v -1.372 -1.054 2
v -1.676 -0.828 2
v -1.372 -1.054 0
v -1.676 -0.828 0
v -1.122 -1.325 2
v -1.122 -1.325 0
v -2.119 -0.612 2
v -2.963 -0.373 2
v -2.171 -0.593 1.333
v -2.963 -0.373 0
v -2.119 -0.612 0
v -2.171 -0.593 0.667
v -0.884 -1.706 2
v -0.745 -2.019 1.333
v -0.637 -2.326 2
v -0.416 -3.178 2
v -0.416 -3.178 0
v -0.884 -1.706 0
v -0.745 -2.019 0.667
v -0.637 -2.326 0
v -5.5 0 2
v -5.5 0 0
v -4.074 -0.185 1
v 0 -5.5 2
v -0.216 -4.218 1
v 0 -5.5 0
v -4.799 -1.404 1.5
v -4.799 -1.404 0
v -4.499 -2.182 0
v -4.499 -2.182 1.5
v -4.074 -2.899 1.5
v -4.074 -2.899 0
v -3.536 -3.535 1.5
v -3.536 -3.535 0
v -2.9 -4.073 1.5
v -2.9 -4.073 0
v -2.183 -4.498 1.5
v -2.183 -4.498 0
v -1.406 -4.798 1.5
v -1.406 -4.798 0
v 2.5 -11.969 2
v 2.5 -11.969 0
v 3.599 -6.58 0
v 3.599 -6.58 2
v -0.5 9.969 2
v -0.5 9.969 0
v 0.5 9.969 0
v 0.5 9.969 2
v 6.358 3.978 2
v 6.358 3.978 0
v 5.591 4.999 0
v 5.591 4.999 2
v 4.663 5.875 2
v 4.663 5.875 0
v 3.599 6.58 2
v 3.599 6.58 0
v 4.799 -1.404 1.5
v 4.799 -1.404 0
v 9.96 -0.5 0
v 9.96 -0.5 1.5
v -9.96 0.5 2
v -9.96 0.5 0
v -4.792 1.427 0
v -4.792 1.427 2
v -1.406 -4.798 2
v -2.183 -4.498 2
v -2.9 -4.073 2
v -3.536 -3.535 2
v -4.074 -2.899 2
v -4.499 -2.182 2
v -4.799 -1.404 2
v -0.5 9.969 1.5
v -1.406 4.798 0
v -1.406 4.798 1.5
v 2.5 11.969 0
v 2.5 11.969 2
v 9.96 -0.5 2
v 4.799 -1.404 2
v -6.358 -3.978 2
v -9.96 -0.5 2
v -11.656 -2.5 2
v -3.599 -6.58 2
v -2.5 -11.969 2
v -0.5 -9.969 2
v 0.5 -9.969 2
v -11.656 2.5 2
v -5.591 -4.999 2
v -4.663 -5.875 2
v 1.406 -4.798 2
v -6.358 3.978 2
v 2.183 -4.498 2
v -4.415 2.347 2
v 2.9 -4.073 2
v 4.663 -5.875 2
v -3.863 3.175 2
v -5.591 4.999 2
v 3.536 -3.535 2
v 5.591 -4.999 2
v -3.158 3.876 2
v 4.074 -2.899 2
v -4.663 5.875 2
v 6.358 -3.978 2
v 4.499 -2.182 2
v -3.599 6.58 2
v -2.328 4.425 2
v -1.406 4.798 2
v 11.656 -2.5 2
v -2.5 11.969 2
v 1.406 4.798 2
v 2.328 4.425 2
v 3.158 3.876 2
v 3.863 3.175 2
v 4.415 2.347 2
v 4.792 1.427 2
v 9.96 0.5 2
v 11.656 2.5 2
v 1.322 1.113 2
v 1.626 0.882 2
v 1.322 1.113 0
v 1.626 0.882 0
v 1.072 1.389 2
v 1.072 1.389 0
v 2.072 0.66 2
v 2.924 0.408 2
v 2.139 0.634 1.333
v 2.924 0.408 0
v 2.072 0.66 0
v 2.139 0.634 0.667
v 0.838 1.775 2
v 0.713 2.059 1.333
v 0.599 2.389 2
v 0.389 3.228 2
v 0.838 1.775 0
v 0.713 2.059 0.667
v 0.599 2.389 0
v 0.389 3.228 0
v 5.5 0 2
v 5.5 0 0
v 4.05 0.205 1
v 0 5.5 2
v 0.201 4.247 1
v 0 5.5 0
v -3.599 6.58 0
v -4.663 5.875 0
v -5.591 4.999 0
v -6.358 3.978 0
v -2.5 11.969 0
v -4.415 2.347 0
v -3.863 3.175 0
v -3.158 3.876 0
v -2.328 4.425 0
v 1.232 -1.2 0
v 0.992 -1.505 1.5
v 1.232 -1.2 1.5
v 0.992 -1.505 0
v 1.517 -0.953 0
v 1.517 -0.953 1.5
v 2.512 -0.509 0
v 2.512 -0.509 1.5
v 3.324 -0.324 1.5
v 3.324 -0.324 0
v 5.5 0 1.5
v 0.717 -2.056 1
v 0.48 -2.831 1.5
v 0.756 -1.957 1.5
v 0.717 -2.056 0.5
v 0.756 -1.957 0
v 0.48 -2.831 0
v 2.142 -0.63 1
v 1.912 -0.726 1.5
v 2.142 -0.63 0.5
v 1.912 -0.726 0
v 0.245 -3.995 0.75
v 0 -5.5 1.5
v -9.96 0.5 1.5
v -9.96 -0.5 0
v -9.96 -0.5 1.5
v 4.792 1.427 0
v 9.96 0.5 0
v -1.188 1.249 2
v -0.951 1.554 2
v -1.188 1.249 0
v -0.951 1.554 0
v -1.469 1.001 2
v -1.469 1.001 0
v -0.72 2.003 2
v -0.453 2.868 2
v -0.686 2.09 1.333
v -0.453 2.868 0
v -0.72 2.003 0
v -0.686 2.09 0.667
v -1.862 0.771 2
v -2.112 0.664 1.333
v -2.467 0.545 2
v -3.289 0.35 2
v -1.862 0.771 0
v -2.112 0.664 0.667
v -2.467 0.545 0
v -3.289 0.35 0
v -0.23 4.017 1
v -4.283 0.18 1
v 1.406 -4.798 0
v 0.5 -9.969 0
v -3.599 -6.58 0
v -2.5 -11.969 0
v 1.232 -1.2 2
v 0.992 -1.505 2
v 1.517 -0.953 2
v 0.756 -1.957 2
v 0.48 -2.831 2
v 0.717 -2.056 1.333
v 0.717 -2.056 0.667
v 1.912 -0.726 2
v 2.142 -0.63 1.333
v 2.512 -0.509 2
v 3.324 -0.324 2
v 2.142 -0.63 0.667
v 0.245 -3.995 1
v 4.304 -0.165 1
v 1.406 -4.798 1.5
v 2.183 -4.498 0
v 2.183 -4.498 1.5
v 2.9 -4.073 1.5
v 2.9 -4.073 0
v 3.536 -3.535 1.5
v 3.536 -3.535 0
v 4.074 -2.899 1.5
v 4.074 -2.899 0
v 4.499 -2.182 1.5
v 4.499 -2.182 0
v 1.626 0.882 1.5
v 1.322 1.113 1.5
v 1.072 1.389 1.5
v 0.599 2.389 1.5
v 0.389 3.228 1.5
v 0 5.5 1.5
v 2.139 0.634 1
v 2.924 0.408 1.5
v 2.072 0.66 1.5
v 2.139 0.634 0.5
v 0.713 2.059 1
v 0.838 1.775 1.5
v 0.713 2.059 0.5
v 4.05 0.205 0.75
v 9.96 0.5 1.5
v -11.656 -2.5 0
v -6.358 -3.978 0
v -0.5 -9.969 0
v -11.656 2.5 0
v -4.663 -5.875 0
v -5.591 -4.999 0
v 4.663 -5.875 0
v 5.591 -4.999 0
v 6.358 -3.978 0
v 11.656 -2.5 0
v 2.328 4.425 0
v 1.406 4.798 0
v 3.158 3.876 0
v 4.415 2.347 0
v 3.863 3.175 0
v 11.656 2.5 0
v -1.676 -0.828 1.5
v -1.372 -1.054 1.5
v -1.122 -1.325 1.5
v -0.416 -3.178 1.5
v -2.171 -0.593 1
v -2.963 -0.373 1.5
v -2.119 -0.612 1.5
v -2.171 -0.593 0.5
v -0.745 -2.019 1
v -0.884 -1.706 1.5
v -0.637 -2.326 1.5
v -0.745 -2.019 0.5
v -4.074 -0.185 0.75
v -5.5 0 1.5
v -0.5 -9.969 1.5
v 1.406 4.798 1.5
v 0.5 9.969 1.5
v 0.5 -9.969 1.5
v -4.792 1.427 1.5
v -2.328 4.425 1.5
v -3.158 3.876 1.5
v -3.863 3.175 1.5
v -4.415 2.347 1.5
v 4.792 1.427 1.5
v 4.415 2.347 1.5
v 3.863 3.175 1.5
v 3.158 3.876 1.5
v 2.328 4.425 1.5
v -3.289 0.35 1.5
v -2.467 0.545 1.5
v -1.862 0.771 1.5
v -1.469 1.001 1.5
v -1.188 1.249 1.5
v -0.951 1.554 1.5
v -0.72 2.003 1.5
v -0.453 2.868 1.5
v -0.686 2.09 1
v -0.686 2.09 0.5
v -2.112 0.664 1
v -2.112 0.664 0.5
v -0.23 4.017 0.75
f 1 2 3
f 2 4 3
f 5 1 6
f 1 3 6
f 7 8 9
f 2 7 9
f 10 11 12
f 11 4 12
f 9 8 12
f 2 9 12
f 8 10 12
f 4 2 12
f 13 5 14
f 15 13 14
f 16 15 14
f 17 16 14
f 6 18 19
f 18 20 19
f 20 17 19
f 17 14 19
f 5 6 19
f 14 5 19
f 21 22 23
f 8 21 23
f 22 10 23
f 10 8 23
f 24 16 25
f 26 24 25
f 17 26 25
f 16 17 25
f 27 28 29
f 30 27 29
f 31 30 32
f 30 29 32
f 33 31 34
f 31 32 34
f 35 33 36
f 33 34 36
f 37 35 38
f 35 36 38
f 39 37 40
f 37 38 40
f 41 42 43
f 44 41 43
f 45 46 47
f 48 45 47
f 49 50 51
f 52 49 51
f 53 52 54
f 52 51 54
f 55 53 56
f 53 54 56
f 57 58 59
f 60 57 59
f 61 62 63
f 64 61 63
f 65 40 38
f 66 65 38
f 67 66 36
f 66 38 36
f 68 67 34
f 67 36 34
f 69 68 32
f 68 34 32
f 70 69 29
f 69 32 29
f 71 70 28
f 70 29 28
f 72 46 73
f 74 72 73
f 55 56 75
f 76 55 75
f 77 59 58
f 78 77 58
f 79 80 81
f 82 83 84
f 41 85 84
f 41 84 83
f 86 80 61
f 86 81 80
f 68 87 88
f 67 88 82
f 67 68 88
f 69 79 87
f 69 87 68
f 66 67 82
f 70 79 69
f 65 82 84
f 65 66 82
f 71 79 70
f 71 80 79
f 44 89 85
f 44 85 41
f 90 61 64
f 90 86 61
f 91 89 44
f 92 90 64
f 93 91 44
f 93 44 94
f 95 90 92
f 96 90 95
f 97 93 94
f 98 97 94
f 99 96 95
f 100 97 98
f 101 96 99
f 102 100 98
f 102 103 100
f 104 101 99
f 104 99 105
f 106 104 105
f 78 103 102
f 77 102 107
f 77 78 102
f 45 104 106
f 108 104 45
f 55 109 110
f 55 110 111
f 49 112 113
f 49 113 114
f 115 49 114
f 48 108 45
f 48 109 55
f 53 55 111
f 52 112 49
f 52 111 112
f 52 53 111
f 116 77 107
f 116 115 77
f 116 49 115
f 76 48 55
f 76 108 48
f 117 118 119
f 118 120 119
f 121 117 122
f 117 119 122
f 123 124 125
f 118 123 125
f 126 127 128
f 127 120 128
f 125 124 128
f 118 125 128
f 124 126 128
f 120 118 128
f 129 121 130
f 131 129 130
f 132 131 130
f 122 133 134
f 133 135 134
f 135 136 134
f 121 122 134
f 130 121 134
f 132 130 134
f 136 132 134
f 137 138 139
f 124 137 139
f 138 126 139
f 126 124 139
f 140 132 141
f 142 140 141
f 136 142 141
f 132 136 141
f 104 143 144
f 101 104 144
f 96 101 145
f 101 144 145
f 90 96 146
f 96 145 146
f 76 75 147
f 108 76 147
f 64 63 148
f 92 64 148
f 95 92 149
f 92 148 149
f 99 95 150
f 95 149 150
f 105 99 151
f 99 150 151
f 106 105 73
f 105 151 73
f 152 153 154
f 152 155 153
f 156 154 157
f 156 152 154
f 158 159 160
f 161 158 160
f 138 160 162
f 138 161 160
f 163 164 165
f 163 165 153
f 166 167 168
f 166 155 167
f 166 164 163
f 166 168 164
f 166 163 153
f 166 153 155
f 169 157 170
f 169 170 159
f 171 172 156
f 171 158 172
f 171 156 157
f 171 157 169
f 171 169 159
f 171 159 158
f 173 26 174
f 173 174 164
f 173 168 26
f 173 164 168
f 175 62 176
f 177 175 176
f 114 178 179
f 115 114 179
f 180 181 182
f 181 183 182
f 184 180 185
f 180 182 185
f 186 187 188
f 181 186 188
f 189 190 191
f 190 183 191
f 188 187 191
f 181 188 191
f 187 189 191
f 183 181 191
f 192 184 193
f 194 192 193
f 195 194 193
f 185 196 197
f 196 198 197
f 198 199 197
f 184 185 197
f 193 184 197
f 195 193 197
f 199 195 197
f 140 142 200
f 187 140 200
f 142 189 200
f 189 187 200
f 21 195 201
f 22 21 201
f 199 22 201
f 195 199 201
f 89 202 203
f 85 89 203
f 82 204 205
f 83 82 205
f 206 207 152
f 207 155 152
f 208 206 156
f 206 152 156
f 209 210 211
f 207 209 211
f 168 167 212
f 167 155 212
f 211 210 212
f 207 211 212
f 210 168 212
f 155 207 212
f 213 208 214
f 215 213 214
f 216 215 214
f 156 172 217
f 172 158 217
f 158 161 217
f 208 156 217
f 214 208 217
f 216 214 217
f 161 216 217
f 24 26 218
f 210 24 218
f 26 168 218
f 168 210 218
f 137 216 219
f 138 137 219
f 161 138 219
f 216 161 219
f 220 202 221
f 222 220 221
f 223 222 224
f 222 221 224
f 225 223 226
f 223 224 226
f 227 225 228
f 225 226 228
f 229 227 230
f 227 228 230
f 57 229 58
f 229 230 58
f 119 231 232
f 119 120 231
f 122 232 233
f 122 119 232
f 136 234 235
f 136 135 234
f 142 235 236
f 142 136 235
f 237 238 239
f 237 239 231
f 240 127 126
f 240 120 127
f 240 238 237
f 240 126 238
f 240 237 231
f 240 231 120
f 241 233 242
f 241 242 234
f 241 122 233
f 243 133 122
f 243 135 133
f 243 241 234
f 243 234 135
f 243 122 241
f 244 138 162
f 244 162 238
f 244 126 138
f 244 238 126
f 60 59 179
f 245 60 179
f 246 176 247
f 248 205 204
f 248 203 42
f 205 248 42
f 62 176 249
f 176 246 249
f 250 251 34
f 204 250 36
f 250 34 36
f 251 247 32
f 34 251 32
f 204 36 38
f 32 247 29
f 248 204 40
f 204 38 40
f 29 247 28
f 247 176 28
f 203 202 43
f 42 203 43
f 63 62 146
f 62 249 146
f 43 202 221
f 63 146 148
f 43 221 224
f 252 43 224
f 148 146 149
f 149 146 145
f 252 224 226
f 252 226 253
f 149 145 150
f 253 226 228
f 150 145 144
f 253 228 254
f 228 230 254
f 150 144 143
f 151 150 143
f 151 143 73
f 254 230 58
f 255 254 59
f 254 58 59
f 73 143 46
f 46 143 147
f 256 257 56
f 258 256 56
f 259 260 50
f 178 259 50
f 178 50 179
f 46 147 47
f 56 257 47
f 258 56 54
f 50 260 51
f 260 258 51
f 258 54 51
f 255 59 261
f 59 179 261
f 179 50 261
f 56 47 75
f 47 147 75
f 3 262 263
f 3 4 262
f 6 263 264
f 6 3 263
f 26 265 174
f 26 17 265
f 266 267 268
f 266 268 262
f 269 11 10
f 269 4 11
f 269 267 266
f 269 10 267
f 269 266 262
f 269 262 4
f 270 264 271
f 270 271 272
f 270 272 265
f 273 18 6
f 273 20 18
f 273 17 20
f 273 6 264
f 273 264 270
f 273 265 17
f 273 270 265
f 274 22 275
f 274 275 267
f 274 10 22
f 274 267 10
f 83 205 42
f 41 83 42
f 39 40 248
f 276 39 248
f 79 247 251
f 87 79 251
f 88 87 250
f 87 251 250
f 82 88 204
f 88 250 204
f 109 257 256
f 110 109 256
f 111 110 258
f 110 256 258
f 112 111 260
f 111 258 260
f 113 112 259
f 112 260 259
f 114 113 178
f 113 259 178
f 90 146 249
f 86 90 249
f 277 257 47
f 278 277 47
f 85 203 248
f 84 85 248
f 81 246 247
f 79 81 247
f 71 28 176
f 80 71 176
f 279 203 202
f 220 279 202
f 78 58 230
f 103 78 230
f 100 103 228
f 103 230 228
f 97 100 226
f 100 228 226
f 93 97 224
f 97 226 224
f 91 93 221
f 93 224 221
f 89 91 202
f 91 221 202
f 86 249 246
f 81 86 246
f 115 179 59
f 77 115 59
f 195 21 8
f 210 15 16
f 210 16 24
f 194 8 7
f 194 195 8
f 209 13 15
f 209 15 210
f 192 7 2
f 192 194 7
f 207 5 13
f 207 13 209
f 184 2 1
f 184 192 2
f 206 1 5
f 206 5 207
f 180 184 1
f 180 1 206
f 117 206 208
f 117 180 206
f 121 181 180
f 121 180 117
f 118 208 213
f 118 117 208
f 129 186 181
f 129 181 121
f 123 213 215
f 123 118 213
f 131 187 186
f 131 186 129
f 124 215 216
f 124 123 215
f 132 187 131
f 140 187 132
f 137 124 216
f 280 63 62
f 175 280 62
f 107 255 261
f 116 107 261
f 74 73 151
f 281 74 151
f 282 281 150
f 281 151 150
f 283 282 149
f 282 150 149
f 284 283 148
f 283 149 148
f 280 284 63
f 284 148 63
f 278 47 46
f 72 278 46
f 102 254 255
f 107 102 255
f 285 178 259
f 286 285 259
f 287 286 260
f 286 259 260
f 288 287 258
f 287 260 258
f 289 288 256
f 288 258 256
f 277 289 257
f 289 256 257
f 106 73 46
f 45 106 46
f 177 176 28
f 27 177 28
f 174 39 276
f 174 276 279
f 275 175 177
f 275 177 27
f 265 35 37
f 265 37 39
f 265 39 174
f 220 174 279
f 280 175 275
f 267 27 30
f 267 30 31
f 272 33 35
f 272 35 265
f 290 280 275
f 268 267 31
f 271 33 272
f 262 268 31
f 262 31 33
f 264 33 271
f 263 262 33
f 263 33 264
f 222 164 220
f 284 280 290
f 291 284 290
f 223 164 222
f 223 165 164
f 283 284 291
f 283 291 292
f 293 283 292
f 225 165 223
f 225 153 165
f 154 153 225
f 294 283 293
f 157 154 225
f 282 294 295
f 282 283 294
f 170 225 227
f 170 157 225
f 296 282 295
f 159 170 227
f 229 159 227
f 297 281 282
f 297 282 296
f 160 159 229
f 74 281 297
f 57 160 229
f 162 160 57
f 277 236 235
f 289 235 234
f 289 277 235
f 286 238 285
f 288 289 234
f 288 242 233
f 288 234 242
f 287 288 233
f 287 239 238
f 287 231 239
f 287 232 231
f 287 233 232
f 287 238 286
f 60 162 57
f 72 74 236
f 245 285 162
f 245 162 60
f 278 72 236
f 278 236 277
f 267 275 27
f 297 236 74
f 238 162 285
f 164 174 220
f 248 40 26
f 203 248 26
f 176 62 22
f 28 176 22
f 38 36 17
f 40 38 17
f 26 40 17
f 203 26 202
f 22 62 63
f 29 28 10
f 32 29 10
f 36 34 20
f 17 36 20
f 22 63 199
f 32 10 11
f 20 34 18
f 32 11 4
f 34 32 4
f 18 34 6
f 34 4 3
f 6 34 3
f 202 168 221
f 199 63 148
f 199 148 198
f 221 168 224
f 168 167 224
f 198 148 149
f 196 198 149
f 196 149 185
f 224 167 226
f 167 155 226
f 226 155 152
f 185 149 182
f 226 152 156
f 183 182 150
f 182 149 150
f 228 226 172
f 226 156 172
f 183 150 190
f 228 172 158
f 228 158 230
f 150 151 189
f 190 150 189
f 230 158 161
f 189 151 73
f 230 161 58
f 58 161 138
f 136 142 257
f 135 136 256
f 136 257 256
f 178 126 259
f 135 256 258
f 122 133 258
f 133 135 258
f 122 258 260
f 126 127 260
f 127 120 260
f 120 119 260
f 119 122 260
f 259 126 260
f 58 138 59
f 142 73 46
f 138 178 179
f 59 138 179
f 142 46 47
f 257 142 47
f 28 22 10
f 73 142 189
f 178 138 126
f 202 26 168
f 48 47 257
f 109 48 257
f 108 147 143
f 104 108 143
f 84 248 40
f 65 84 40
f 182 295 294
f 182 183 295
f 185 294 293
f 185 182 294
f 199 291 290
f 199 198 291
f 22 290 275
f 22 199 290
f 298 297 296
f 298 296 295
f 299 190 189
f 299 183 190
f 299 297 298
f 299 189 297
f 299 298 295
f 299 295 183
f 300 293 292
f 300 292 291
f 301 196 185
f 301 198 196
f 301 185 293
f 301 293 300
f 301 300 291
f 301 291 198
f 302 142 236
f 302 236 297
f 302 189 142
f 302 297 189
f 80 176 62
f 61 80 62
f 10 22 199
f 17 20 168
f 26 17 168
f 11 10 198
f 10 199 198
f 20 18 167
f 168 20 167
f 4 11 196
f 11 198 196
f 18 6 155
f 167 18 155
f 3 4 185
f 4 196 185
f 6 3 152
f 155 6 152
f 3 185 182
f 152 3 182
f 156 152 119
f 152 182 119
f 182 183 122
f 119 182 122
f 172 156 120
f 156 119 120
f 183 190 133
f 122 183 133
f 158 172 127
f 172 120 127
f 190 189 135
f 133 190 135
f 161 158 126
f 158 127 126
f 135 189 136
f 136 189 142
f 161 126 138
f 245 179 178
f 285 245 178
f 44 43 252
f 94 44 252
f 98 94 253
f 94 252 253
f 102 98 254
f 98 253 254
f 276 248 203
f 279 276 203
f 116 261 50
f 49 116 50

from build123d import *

# Parameters (mm, degrees)
F1_DEPTH = 2
F2_DEPTH = 1.5


with BuildPart() as f1:
    # F0 (on Top) → F1 (new body)
    with BuildSketch(Plane.XY):
        with BuildLine():
            Line((2.5, 11.969367), (-2.5, 11.969367))
            Line((-2.5, 11.969367), (-3.598701, 6.580224))
            ThreePointArc((-3.598701, 6.580224), (-5.145545, 5.456497), (-6.357999, 3.978171))
            Line((-6.357999, 3.978171), (-11.655641, 2.5))
            Line((-11.655641, 2.5), (-11.655641, -2.5))
            Line((-11.655641, -2.5), (-6.357999, -3.978171))
            ThreePointArc((-6.357999, -3.978171), (-5.145545, -5.456497), (-3.598701, -6.580224))
            Line((-3.598701, -6.580224), (-2.5, -11.969367))
            Line((-2.5, -11.969367), (2.5, -11.969367))
            Line((2.5, -11.969367), (3.598701, -6.580224))
            ThreePointArc((3.598701, -6.580224), (5.145545, -5.456497), (6.357999, -3.978171))
            Line((6.357999, -3.978171), (11.655641, -2.5))
            Line((11.655641, -2.5), (11.655641, 2.5))
            Line((11.655641, 2.5), (6.357999, 3.978171))
            ThreePointArc((6.357999, 3.978171), (5.145545, 5.456497), (3.598701, 6.580224))
            Line((3.598701, 6.580224), (2.5, 11.969367))
        make_face()
        with BuildLine():
            ThreePointArc((-4.792149, 1.426642), (-3.528005, 3.543047), (-1.406242, 4.798175))
            Line((-1.406242, 4.798175), (-0.5, 9.969367))
            Line((-0.5, 9.969367), (0.5, 9.969367))
            Line((0.5, 9.969367), (1.406242, 4.798175))
            ThreePointArc((1.406242, 4.798175), (3.528005, 3.543047), (4.792149, 1.426642))
            Line((4.792149, 1.426642), (9.959724, 0.5))
            Line((9.959724, 0.5), (9.959724, -0.5))
            Line((9.959724, -0.5), (4.798697, -1.404461))
            ThreePointArc((4.798697, -1.404461), (3.53619, -3.534878), (1.406242, -4.798175))
            Line((1.406242, -4.798175), (0.5, -9.969367))
            Line((0.5, -9.969367), (-0.5, -9.969367))
            Line((-0.5, -9.969367), (-1.406242, -4.798175))
            ThreePointArc((-1.406242, -4.798175), (-3.53619, -3.534878), (-4.798697, -1.404461))
            Line((-4.798697, -1.404461), (-9.959724, -0.5))
            Line((-9.959724, -0.5), (-9.959724, 0.5))
            Line((-9.959724, 0.5), (-4.792149, 1.426642))
        make_face(mode=Mode.SUBTRACT)
        with BuildLine():
            add(Edge.make_bspline(
                [(0, 5.5), (-0.722807, 0.69105), (-0.722807, 0.69105), (-5.5, 0)],
                knots=[0, 0, 0, 0, 7.778175, 7.778175, 7.778175, 7.778175], degree=3))
            add(Edge.make_bspline(
                [(-5.5, 0), (-0.81189, -0.58381), (-0.81189, -0.58381), (0, -5.5)],
                knots=[0, 0, 0, 0, 7.778175, 7.778175, 7.778175, 7.778175], degree=3))
            add(Edge.make_bspline(
                [(0, -5.5), (0.769275, -0.638917), (0.769275, -0.638917), (5.5, 0)],
                knots=[0, 0, 0, 0, 7.778175, 7.778175, 7.778175, 7.778175], degree=3))
            add(Edge.make_bspline(
                [(5.5, 0), (0.764375, 0.644772), (0.764375, 0.644772), (0, 5.5)],
                knots=[0, 0, 0, 0, 7.778175, 7.778175, 7.778175, 7.778175], degree=3))
        make_face()
    extrude(amount=F1_DEPTH)


with BuildPart() as f2:
    # F0 (on Top) → F2 (new body)
    with BuildSketch(Plane.XY):
        with BuildLine():
            Line((-0.5, 9.969367), (-1.406242, 4.798175))
            ThreePointArc((-1.406242, 4.798175), (-3.528005, 3.543047), (-4.792149, 1.426642))
            Line((-4.792149, 1.426642), (-9.959724, 0.5))
            Line((-9.959724, 0.5), (-9.959724, -0.5))
            Line((-9.959724, -0.5), (-4.798697, -1.404461))
            ThreePointArc((-4.798697, -1.404461), (-3.53619, -3.534878), (-1.406242, -4.798175))
            Line((-1.406242, -4.798175), (-0.5, -9.969367))
            Line((-0.5, -9.969367), (0.5, -9.969367))
            Line((0.5, -9.969367), (1.406242, -4.798175))
            ThreePointArc((1.406242, -4.798175), (3.53619, -3.534878), (4.798697, -1.404461))
            Line((4.798697, -1.404461), (9.959724, -0.5))
            Line((9.959724, -0.5), (9.959724, 0.5))
            Line((9.959724, 0.5), (4.792149, 1.426642))
            ThreePointArc((4.792149, 1.426642), (3.528005, 3.543047), (1.406242, 4.798175))
            Line((1.406242, 4.798175), (0.5, 9.969367))
            Line((0.5, 9.969367), (-0.5, 9.969367))
        make_face()
        with BuildLine():
            add(Edge.make_bspline(
                [(-5.5, 0), (-0.81189, -0.58381), (-0.81189, -0.58381), (0, -5.5)],
                knots=[0, 0, 0, 0, 7.778175, 7.778175, 7.778175, 7.778175], degree=3))
            add(Edge.make_bspline(
                [(0, 5.5), (-0.722807, 0.69105), (-0.722807, 0.69105), (-5.5, 0)],
                knots=[0, 0, 0, 0, 7.778175, 7.778175, 7.778175, 7.778175], degree=3))
            add(Edge.make_bspline(
                [(5.5, 0), (0.764375, 0.644772), (0.764375, 0.644772), (0, 5.5)],
                knots=[0, 0, 0, 0, 7.778175, 7.778175, 7.778175, 7.778175], degree=3))
            add(Edge.make_bspline(
                [(0, -5.5), (0.769275, -0.638917), (0.769275, -0.638917), (5.5, 0)],
                knots=[0, 0, 0, 0, 7.778175, 7.778175, 7.778175, 7.778175], degree=3))
        make_face(mode=Mode.SUBTRACT)
    extrude(amount=F2_DEPTH)


solid = Compound([f1.part, f2.part])
